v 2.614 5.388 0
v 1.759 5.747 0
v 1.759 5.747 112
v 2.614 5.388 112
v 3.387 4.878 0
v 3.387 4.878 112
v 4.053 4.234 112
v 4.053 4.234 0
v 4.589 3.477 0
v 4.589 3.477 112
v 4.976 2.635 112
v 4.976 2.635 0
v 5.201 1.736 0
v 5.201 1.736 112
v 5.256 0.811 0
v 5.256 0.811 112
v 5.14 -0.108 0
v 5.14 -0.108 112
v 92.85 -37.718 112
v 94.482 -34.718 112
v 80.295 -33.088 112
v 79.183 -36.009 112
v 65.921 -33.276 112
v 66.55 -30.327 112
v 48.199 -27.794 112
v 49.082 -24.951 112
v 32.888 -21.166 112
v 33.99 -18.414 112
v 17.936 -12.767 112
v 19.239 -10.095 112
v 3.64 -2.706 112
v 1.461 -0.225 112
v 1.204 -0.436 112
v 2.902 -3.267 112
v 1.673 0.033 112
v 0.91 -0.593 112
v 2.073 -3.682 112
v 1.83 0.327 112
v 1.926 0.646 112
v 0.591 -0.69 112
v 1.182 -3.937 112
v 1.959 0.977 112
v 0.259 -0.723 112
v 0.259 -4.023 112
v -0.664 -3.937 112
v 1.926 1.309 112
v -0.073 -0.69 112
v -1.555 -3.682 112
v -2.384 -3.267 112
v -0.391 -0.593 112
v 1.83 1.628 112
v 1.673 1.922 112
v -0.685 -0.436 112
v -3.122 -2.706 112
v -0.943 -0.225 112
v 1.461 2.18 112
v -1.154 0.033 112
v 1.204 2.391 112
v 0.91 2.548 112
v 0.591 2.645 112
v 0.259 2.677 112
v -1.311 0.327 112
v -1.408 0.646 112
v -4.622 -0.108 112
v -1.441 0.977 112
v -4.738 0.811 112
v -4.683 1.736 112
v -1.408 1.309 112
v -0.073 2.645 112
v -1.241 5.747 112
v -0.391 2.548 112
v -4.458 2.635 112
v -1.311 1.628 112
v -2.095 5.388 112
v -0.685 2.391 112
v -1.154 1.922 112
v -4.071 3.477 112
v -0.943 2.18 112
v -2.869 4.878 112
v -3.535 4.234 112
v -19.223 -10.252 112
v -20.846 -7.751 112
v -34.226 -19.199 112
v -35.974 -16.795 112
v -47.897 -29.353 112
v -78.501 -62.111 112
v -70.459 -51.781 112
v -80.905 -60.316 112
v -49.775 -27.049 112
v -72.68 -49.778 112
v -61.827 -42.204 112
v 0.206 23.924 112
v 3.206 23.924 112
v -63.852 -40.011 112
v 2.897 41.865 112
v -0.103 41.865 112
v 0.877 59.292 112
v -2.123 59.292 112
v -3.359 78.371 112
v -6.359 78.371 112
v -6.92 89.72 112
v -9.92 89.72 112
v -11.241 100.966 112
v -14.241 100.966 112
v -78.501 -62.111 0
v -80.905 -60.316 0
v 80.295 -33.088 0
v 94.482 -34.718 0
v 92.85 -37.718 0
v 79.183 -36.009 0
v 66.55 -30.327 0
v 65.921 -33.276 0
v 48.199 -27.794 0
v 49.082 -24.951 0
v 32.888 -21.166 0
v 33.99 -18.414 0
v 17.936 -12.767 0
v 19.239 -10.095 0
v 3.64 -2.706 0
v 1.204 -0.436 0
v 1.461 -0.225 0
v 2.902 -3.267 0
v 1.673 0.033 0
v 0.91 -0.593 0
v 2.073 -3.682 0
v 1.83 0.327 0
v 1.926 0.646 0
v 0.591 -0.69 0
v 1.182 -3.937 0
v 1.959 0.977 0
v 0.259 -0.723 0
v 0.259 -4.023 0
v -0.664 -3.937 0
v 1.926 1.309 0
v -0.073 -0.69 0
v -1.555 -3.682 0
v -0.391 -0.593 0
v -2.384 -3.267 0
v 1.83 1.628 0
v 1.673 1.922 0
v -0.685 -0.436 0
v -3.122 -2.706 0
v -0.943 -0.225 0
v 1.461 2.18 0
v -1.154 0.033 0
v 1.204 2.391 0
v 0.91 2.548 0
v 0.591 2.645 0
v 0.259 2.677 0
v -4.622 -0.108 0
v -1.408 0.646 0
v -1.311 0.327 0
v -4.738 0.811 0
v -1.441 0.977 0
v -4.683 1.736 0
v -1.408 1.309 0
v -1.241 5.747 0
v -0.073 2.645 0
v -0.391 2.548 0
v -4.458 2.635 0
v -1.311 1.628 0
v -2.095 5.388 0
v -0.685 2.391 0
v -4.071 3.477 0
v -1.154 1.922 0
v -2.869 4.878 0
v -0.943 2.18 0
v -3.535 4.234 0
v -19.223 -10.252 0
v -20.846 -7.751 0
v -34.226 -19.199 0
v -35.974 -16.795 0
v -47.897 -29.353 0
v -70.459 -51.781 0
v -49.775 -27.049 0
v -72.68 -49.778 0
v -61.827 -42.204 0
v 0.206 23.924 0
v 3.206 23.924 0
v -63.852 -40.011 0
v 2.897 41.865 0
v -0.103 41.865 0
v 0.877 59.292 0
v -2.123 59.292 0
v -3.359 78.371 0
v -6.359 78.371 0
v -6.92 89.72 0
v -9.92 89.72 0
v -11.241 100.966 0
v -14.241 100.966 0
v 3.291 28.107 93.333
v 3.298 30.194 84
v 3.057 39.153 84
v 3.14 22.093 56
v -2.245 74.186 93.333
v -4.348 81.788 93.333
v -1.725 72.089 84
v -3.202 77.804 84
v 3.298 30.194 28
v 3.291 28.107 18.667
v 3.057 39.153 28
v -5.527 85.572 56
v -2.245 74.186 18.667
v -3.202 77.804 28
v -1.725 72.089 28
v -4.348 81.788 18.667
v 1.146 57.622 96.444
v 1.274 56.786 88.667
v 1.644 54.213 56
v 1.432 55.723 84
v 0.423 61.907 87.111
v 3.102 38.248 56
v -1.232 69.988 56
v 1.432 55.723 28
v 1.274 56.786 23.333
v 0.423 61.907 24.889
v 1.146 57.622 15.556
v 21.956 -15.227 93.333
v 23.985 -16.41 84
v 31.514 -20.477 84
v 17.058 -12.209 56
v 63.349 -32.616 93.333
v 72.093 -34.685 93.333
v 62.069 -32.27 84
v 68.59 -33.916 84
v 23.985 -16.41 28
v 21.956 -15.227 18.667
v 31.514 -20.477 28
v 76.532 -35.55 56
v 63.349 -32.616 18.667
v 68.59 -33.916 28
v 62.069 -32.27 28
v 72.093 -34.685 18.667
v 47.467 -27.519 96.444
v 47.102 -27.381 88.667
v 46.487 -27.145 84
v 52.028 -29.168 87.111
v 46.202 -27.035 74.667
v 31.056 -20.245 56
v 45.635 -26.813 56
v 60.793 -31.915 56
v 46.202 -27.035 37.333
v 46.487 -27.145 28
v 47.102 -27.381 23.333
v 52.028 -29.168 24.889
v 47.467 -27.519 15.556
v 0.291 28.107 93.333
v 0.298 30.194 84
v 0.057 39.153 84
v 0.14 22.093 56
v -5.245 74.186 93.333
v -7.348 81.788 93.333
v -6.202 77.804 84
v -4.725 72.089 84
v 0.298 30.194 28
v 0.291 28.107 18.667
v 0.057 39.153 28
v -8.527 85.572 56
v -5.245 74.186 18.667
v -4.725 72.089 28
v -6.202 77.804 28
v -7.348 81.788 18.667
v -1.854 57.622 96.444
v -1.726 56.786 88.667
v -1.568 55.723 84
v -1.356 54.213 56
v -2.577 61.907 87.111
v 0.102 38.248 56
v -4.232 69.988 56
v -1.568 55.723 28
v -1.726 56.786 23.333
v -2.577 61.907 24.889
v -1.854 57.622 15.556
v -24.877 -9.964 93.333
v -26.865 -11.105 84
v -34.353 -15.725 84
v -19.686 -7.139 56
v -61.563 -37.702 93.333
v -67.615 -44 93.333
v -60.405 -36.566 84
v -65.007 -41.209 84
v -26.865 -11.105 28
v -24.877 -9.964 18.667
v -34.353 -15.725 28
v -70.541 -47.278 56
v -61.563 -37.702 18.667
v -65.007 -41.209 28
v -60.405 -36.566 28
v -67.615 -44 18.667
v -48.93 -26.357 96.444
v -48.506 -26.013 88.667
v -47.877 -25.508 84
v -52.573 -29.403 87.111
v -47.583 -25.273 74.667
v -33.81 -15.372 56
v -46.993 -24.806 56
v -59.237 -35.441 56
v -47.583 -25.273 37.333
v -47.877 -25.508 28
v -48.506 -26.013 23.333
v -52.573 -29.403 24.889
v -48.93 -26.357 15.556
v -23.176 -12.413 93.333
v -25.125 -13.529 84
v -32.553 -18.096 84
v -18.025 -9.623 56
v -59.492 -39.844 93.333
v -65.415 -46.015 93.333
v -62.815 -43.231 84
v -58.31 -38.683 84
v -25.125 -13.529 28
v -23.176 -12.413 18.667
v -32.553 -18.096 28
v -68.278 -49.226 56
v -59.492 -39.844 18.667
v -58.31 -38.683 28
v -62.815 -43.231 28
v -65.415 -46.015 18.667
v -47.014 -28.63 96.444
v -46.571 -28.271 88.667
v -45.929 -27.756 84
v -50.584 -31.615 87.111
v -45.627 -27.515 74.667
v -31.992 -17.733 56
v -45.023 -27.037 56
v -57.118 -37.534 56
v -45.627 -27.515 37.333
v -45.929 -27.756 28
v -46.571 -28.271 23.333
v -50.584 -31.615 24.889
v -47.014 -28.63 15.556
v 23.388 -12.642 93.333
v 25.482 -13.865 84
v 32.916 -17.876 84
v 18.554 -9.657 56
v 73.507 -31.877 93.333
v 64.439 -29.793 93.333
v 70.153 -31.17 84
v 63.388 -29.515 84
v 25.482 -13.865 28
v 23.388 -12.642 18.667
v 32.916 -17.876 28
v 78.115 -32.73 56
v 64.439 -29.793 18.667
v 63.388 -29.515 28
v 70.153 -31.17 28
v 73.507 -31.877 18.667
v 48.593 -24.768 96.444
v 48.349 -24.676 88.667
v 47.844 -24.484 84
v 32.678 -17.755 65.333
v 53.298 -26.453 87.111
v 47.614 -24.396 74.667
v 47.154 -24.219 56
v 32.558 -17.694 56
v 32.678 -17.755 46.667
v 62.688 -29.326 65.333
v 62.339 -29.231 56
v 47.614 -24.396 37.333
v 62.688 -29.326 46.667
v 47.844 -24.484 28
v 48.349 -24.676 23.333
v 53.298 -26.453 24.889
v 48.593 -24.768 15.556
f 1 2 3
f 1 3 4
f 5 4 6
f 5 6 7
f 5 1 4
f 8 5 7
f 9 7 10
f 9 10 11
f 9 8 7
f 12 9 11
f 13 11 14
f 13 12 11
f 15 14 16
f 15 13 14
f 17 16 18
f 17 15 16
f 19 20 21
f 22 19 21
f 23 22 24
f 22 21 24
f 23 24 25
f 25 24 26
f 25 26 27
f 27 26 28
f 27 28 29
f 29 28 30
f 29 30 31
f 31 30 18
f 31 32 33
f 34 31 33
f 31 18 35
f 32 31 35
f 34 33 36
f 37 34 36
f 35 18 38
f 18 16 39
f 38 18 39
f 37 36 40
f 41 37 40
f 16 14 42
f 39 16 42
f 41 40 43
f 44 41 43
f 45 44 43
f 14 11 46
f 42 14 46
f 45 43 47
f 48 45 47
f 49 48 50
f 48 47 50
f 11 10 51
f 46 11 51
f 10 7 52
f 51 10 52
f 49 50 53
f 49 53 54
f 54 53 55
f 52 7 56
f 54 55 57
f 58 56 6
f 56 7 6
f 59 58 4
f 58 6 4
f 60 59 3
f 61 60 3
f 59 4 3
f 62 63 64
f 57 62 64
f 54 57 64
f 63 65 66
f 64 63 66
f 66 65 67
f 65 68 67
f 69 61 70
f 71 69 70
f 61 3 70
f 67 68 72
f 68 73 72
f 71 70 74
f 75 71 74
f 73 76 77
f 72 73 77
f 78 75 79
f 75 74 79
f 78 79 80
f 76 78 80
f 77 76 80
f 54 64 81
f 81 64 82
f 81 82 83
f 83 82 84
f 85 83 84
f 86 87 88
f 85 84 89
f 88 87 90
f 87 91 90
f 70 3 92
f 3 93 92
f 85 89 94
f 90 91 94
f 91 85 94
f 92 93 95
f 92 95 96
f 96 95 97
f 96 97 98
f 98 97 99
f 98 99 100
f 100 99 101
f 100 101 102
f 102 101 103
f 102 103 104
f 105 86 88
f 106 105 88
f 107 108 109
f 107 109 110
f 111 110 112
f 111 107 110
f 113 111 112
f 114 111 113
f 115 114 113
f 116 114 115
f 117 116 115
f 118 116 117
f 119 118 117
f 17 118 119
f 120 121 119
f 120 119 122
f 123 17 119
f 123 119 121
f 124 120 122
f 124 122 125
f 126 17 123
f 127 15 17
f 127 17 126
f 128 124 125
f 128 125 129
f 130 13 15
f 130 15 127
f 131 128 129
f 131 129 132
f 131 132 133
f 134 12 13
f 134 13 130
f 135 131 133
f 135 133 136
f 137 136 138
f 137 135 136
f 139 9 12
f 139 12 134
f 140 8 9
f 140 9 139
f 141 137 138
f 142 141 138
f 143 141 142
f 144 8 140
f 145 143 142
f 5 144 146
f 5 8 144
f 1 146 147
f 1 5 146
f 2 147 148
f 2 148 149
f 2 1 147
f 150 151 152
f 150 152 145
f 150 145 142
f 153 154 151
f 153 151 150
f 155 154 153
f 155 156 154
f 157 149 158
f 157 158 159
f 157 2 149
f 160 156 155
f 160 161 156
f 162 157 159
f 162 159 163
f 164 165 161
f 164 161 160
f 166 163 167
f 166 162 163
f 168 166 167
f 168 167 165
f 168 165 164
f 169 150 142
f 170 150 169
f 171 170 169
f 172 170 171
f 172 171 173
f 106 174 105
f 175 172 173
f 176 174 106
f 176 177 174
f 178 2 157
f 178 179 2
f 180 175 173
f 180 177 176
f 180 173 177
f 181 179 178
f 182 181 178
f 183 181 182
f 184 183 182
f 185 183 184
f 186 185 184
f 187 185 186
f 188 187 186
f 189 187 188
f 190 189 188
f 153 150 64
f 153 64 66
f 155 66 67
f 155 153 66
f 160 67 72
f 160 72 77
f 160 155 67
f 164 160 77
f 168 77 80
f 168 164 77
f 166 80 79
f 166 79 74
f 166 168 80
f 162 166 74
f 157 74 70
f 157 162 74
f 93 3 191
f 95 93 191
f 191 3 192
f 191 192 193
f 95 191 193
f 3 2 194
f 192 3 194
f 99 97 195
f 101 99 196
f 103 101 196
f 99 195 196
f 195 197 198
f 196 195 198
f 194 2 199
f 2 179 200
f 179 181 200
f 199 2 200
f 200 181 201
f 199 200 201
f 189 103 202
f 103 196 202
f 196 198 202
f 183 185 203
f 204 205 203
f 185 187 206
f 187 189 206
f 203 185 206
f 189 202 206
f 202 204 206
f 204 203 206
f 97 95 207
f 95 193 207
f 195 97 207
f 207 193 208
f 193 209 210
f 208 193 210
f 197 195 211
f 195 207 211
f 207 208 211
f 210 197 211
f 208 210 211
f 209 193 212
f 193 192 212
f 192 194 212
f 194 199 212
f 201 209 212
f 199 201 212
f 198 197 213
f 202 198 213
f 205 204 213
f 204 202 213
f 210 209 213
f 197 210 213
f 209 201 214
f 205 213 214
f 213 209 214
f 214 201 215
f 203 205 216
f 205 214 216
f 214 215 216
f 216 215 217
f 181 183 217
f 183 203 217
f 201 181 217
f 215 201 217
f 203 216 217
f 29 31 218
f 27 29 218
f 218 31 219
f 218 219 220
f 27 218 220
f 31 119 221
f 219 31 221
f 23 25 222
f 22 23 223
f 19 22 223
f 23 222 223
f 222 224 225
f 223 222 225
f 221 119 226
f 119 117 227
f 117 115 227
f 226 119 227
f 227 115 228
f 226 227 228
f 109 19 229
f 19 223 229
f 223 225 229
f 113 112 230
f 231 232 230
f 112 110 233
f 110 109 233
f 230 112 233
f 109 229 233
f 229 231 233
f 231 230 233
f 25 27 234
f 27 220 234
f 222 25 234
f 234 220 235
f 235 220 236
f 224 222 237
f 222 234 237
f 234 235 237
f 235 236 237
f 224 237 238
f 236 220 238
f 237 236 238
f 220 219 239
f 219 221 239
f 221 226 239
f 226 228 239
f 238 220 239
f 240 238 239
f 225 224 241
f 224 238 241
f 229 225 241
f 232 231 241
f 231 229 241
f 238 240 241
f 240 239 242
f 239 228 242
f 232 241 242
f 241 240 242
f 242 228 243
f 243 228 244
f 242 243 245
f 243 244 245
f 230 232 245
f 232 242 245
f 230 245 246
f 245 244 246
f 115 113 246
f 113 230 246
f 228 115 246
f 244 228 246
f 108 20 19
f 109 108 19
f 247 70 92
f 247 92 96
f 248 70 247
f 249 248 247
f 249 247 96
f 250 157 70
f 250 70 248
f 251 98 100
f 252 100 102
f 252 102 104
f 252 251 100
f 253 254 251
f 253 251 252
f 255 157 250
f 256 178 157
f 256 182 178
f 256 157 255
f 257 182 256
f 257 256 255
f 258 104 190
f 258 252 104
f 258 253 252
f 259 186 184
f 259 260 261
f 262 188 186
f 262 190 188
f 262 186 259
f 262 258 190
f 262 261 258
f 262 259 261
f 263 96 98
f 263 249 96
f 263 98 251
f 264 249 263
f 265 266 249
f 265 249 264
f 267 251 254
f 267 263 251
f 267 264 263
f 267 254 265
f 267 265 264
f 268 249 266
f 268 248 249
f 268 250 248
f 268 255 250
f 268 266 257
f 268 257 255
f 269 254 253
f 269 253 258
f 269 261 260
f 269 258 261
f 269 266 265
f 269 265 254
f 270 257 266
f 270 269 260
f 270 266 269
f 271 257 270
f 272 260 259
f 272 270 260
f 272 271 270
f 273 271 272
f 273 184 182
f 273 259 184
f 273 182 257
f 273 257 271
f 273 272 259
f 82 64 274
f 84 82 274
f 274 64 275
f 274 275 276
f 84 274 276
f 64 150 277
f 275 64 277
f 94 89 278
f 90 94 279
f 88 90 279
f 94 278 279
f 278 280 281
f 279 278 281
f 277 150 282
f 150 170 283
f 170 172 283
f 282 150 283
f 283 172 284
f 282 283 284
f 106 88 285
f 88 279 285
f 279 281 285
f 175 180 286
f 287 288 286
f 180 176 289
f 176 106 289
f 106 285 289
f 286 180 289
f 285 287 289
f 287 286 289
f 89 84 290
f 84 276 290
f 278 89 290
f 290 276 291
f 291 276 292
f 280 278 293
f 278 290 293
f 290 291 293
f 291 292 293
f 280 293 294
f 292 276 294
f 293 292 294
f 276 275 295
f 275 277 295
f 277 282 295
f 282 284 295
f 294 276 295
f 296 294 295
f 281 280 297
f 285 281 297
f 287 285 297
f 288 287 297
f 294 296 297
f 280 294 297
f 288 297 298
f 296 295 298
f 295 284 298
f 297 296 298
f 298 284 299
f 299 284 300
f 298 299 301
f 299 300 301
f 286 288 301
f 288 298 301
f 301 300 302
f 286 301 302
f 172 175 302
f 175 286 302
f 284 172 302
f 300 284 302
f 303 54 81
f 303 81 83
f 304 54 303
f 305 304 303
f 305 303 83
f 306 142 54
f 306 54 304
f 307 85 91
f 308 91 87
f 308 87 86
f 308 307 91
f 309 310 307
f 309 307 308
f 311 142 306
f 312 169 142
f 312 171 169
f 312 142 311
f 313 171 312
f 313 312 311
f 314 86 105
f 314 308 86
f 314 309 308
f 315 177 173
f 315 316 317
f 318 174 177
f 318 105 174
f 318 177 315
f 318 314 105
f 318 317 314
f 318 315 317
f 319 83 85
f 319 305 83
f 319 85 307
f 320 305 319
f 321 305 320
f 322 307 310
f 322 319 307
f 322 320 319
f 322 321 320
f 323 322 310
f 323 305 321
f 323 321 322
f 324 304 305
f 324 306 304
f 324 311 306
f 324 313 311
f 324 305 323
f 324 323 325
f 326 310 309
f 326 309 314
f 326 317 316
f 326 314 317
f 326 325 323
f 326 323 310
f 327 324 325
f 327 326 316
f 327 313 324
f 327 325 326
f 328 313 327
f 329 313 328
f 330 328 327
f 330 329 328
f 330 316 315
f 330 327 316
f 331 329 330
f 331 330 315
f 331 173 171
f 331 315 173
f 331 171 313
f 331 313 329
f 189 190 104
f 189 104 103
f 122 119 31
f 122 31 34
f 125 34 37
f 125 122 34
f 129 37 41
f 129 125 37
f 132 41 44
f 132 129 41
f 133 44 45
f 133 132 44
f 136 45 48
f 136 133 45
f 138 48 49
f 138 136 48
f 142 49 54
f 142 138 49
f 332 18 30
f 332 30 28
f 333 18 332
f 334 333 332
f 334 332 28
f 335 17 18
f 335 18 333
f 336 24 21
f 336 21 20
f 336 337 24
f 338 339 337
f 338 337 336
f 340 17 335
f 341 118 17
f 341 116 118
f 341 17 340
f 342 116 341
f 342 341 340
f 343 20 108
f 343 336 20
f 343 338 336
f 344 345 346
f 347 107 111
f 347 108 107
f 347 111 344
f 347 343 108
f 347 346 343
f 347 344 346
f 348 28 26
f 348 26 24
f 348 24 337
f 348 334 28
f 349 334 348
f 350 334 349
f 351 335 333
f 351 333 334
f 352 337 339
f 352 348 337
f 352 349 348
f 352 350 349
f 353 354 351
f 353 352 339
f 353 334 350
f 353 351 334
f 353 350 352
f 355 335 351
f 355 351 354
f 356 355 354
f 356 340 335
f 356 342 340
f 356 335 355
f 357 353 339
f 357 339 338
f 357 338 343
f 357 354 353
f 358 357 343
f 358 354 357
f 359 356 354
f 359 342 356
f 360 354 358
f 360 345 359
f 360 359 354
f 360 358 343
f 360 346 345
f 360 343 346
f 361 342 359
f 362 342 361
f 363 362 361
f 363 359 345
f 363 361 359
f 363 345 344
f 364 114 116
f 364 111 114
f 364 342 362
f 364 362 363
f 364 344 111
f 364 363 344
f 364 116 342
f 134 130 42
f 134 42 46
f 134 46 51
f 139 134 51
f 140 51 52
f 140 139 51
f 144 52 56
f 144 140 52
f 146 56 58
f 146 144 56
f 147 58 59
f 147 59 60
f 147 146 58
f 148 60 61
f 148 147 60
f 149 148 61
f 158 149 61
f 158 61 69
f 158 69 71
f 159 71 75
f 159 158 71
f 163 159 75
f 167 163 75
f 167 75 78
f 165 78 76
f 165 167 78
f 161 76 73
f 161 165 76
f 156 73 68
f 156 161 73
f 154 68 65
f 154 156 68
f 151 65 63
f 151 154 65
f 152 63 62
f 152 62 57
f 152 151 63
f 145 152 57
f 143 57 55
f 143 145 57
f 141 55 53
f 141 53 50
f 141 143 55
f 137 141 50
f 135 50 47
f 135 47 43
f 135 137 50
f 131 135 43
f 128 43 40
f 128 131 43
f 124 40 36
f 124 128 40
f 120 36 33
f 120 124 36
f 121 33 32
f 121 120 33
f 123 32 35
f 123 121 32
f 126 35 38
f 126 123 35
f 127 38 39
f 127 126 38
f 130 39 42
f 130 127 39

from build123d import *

# Parameters (mm, degrees)
SKETCH_1_R      = 1.7
EXTRUDE_1_DEPTH = 112


with BuildPart() as part:
    # 草图1 → 凸台-拉伸1 (new body)
    with BuildSketch(Plane.XY):
        with BuildLine():
            Line((-14.240871753, 100.966248357), (-11.240871753, 100.966248357))
            add(Edge.make_bspline(
                [(1.759128247, 5.747194997), (8.029571787, 55.068895095), (-11.240871753, 100.966248357)],
                knots=[0, 0, 0, 1, 1, 1], degree=2))
            ThreePointArc((1.759128247, 5.747194997), (4.589255266, 3.47749899), (5.139806158, -0.108310908))
            add(Edge.make_bspline(
                [(5.139806158, -0.108310908), (44.496199832, -31.024270121), (94.481890105, -34.717837588)],
                knots=[0, 0, 0, 1, 1, 1], degree=2))
            Line((94.481890105, -34.717837588), (92.849882086, -37.717837588))
            add(Edge.make_bspline(
                [(3.639806158, -2.706387119), (43.024769755, -33.414304879), (92.849882086, -37.717837588)],
                knots=[0, 0, 0, 1, 1, 1], degree=2))
            ThreePointArc((3.639806158, -2.706387119), (0.259128247, -4.02250101), (-3.121549663, -2.706387119))
            add(Edge.make_bspline(
                [(-3.121549663, -2.706387119), (-49.234666098, -21.664678742), (-78.501197374, -62.111237788)],
                knots=[0, 0, 0, 1, 1, 1], degree=2))
            Line((-78.501197374, -62.111237788), (-80.904697275, -60.315913799))
            add(Edge.make_bspline(
                [(-4.621549663, -0.108310908), (-51.223666378, -19.399256747), (-80.904697275, -60.315913799)],
                knots=[0, 0, 0, 1, 1, 1], degree=2))
            ThreePointArc((-4.621549663, -0.108310908), (-4.070998772, 3.47749899), (-1.240871753, 5.747194997))
            add(Edge.make_bspline(
                [(-1.240871753, 5.747194997), (5.029571787, 55.068895095), (-14.240871753, 100.966248357)],
                knots=[0, 0, 0, 1, 1, 1], degree=2))
        make_face()
        with Locations((0.259128247, 0.97749899)):
            Circle(SKETCH_1_R, mode=Mode.SUBTRACT)
    extrude(amount=EXTRUDE_1_DEPTH)


solid = part.part
